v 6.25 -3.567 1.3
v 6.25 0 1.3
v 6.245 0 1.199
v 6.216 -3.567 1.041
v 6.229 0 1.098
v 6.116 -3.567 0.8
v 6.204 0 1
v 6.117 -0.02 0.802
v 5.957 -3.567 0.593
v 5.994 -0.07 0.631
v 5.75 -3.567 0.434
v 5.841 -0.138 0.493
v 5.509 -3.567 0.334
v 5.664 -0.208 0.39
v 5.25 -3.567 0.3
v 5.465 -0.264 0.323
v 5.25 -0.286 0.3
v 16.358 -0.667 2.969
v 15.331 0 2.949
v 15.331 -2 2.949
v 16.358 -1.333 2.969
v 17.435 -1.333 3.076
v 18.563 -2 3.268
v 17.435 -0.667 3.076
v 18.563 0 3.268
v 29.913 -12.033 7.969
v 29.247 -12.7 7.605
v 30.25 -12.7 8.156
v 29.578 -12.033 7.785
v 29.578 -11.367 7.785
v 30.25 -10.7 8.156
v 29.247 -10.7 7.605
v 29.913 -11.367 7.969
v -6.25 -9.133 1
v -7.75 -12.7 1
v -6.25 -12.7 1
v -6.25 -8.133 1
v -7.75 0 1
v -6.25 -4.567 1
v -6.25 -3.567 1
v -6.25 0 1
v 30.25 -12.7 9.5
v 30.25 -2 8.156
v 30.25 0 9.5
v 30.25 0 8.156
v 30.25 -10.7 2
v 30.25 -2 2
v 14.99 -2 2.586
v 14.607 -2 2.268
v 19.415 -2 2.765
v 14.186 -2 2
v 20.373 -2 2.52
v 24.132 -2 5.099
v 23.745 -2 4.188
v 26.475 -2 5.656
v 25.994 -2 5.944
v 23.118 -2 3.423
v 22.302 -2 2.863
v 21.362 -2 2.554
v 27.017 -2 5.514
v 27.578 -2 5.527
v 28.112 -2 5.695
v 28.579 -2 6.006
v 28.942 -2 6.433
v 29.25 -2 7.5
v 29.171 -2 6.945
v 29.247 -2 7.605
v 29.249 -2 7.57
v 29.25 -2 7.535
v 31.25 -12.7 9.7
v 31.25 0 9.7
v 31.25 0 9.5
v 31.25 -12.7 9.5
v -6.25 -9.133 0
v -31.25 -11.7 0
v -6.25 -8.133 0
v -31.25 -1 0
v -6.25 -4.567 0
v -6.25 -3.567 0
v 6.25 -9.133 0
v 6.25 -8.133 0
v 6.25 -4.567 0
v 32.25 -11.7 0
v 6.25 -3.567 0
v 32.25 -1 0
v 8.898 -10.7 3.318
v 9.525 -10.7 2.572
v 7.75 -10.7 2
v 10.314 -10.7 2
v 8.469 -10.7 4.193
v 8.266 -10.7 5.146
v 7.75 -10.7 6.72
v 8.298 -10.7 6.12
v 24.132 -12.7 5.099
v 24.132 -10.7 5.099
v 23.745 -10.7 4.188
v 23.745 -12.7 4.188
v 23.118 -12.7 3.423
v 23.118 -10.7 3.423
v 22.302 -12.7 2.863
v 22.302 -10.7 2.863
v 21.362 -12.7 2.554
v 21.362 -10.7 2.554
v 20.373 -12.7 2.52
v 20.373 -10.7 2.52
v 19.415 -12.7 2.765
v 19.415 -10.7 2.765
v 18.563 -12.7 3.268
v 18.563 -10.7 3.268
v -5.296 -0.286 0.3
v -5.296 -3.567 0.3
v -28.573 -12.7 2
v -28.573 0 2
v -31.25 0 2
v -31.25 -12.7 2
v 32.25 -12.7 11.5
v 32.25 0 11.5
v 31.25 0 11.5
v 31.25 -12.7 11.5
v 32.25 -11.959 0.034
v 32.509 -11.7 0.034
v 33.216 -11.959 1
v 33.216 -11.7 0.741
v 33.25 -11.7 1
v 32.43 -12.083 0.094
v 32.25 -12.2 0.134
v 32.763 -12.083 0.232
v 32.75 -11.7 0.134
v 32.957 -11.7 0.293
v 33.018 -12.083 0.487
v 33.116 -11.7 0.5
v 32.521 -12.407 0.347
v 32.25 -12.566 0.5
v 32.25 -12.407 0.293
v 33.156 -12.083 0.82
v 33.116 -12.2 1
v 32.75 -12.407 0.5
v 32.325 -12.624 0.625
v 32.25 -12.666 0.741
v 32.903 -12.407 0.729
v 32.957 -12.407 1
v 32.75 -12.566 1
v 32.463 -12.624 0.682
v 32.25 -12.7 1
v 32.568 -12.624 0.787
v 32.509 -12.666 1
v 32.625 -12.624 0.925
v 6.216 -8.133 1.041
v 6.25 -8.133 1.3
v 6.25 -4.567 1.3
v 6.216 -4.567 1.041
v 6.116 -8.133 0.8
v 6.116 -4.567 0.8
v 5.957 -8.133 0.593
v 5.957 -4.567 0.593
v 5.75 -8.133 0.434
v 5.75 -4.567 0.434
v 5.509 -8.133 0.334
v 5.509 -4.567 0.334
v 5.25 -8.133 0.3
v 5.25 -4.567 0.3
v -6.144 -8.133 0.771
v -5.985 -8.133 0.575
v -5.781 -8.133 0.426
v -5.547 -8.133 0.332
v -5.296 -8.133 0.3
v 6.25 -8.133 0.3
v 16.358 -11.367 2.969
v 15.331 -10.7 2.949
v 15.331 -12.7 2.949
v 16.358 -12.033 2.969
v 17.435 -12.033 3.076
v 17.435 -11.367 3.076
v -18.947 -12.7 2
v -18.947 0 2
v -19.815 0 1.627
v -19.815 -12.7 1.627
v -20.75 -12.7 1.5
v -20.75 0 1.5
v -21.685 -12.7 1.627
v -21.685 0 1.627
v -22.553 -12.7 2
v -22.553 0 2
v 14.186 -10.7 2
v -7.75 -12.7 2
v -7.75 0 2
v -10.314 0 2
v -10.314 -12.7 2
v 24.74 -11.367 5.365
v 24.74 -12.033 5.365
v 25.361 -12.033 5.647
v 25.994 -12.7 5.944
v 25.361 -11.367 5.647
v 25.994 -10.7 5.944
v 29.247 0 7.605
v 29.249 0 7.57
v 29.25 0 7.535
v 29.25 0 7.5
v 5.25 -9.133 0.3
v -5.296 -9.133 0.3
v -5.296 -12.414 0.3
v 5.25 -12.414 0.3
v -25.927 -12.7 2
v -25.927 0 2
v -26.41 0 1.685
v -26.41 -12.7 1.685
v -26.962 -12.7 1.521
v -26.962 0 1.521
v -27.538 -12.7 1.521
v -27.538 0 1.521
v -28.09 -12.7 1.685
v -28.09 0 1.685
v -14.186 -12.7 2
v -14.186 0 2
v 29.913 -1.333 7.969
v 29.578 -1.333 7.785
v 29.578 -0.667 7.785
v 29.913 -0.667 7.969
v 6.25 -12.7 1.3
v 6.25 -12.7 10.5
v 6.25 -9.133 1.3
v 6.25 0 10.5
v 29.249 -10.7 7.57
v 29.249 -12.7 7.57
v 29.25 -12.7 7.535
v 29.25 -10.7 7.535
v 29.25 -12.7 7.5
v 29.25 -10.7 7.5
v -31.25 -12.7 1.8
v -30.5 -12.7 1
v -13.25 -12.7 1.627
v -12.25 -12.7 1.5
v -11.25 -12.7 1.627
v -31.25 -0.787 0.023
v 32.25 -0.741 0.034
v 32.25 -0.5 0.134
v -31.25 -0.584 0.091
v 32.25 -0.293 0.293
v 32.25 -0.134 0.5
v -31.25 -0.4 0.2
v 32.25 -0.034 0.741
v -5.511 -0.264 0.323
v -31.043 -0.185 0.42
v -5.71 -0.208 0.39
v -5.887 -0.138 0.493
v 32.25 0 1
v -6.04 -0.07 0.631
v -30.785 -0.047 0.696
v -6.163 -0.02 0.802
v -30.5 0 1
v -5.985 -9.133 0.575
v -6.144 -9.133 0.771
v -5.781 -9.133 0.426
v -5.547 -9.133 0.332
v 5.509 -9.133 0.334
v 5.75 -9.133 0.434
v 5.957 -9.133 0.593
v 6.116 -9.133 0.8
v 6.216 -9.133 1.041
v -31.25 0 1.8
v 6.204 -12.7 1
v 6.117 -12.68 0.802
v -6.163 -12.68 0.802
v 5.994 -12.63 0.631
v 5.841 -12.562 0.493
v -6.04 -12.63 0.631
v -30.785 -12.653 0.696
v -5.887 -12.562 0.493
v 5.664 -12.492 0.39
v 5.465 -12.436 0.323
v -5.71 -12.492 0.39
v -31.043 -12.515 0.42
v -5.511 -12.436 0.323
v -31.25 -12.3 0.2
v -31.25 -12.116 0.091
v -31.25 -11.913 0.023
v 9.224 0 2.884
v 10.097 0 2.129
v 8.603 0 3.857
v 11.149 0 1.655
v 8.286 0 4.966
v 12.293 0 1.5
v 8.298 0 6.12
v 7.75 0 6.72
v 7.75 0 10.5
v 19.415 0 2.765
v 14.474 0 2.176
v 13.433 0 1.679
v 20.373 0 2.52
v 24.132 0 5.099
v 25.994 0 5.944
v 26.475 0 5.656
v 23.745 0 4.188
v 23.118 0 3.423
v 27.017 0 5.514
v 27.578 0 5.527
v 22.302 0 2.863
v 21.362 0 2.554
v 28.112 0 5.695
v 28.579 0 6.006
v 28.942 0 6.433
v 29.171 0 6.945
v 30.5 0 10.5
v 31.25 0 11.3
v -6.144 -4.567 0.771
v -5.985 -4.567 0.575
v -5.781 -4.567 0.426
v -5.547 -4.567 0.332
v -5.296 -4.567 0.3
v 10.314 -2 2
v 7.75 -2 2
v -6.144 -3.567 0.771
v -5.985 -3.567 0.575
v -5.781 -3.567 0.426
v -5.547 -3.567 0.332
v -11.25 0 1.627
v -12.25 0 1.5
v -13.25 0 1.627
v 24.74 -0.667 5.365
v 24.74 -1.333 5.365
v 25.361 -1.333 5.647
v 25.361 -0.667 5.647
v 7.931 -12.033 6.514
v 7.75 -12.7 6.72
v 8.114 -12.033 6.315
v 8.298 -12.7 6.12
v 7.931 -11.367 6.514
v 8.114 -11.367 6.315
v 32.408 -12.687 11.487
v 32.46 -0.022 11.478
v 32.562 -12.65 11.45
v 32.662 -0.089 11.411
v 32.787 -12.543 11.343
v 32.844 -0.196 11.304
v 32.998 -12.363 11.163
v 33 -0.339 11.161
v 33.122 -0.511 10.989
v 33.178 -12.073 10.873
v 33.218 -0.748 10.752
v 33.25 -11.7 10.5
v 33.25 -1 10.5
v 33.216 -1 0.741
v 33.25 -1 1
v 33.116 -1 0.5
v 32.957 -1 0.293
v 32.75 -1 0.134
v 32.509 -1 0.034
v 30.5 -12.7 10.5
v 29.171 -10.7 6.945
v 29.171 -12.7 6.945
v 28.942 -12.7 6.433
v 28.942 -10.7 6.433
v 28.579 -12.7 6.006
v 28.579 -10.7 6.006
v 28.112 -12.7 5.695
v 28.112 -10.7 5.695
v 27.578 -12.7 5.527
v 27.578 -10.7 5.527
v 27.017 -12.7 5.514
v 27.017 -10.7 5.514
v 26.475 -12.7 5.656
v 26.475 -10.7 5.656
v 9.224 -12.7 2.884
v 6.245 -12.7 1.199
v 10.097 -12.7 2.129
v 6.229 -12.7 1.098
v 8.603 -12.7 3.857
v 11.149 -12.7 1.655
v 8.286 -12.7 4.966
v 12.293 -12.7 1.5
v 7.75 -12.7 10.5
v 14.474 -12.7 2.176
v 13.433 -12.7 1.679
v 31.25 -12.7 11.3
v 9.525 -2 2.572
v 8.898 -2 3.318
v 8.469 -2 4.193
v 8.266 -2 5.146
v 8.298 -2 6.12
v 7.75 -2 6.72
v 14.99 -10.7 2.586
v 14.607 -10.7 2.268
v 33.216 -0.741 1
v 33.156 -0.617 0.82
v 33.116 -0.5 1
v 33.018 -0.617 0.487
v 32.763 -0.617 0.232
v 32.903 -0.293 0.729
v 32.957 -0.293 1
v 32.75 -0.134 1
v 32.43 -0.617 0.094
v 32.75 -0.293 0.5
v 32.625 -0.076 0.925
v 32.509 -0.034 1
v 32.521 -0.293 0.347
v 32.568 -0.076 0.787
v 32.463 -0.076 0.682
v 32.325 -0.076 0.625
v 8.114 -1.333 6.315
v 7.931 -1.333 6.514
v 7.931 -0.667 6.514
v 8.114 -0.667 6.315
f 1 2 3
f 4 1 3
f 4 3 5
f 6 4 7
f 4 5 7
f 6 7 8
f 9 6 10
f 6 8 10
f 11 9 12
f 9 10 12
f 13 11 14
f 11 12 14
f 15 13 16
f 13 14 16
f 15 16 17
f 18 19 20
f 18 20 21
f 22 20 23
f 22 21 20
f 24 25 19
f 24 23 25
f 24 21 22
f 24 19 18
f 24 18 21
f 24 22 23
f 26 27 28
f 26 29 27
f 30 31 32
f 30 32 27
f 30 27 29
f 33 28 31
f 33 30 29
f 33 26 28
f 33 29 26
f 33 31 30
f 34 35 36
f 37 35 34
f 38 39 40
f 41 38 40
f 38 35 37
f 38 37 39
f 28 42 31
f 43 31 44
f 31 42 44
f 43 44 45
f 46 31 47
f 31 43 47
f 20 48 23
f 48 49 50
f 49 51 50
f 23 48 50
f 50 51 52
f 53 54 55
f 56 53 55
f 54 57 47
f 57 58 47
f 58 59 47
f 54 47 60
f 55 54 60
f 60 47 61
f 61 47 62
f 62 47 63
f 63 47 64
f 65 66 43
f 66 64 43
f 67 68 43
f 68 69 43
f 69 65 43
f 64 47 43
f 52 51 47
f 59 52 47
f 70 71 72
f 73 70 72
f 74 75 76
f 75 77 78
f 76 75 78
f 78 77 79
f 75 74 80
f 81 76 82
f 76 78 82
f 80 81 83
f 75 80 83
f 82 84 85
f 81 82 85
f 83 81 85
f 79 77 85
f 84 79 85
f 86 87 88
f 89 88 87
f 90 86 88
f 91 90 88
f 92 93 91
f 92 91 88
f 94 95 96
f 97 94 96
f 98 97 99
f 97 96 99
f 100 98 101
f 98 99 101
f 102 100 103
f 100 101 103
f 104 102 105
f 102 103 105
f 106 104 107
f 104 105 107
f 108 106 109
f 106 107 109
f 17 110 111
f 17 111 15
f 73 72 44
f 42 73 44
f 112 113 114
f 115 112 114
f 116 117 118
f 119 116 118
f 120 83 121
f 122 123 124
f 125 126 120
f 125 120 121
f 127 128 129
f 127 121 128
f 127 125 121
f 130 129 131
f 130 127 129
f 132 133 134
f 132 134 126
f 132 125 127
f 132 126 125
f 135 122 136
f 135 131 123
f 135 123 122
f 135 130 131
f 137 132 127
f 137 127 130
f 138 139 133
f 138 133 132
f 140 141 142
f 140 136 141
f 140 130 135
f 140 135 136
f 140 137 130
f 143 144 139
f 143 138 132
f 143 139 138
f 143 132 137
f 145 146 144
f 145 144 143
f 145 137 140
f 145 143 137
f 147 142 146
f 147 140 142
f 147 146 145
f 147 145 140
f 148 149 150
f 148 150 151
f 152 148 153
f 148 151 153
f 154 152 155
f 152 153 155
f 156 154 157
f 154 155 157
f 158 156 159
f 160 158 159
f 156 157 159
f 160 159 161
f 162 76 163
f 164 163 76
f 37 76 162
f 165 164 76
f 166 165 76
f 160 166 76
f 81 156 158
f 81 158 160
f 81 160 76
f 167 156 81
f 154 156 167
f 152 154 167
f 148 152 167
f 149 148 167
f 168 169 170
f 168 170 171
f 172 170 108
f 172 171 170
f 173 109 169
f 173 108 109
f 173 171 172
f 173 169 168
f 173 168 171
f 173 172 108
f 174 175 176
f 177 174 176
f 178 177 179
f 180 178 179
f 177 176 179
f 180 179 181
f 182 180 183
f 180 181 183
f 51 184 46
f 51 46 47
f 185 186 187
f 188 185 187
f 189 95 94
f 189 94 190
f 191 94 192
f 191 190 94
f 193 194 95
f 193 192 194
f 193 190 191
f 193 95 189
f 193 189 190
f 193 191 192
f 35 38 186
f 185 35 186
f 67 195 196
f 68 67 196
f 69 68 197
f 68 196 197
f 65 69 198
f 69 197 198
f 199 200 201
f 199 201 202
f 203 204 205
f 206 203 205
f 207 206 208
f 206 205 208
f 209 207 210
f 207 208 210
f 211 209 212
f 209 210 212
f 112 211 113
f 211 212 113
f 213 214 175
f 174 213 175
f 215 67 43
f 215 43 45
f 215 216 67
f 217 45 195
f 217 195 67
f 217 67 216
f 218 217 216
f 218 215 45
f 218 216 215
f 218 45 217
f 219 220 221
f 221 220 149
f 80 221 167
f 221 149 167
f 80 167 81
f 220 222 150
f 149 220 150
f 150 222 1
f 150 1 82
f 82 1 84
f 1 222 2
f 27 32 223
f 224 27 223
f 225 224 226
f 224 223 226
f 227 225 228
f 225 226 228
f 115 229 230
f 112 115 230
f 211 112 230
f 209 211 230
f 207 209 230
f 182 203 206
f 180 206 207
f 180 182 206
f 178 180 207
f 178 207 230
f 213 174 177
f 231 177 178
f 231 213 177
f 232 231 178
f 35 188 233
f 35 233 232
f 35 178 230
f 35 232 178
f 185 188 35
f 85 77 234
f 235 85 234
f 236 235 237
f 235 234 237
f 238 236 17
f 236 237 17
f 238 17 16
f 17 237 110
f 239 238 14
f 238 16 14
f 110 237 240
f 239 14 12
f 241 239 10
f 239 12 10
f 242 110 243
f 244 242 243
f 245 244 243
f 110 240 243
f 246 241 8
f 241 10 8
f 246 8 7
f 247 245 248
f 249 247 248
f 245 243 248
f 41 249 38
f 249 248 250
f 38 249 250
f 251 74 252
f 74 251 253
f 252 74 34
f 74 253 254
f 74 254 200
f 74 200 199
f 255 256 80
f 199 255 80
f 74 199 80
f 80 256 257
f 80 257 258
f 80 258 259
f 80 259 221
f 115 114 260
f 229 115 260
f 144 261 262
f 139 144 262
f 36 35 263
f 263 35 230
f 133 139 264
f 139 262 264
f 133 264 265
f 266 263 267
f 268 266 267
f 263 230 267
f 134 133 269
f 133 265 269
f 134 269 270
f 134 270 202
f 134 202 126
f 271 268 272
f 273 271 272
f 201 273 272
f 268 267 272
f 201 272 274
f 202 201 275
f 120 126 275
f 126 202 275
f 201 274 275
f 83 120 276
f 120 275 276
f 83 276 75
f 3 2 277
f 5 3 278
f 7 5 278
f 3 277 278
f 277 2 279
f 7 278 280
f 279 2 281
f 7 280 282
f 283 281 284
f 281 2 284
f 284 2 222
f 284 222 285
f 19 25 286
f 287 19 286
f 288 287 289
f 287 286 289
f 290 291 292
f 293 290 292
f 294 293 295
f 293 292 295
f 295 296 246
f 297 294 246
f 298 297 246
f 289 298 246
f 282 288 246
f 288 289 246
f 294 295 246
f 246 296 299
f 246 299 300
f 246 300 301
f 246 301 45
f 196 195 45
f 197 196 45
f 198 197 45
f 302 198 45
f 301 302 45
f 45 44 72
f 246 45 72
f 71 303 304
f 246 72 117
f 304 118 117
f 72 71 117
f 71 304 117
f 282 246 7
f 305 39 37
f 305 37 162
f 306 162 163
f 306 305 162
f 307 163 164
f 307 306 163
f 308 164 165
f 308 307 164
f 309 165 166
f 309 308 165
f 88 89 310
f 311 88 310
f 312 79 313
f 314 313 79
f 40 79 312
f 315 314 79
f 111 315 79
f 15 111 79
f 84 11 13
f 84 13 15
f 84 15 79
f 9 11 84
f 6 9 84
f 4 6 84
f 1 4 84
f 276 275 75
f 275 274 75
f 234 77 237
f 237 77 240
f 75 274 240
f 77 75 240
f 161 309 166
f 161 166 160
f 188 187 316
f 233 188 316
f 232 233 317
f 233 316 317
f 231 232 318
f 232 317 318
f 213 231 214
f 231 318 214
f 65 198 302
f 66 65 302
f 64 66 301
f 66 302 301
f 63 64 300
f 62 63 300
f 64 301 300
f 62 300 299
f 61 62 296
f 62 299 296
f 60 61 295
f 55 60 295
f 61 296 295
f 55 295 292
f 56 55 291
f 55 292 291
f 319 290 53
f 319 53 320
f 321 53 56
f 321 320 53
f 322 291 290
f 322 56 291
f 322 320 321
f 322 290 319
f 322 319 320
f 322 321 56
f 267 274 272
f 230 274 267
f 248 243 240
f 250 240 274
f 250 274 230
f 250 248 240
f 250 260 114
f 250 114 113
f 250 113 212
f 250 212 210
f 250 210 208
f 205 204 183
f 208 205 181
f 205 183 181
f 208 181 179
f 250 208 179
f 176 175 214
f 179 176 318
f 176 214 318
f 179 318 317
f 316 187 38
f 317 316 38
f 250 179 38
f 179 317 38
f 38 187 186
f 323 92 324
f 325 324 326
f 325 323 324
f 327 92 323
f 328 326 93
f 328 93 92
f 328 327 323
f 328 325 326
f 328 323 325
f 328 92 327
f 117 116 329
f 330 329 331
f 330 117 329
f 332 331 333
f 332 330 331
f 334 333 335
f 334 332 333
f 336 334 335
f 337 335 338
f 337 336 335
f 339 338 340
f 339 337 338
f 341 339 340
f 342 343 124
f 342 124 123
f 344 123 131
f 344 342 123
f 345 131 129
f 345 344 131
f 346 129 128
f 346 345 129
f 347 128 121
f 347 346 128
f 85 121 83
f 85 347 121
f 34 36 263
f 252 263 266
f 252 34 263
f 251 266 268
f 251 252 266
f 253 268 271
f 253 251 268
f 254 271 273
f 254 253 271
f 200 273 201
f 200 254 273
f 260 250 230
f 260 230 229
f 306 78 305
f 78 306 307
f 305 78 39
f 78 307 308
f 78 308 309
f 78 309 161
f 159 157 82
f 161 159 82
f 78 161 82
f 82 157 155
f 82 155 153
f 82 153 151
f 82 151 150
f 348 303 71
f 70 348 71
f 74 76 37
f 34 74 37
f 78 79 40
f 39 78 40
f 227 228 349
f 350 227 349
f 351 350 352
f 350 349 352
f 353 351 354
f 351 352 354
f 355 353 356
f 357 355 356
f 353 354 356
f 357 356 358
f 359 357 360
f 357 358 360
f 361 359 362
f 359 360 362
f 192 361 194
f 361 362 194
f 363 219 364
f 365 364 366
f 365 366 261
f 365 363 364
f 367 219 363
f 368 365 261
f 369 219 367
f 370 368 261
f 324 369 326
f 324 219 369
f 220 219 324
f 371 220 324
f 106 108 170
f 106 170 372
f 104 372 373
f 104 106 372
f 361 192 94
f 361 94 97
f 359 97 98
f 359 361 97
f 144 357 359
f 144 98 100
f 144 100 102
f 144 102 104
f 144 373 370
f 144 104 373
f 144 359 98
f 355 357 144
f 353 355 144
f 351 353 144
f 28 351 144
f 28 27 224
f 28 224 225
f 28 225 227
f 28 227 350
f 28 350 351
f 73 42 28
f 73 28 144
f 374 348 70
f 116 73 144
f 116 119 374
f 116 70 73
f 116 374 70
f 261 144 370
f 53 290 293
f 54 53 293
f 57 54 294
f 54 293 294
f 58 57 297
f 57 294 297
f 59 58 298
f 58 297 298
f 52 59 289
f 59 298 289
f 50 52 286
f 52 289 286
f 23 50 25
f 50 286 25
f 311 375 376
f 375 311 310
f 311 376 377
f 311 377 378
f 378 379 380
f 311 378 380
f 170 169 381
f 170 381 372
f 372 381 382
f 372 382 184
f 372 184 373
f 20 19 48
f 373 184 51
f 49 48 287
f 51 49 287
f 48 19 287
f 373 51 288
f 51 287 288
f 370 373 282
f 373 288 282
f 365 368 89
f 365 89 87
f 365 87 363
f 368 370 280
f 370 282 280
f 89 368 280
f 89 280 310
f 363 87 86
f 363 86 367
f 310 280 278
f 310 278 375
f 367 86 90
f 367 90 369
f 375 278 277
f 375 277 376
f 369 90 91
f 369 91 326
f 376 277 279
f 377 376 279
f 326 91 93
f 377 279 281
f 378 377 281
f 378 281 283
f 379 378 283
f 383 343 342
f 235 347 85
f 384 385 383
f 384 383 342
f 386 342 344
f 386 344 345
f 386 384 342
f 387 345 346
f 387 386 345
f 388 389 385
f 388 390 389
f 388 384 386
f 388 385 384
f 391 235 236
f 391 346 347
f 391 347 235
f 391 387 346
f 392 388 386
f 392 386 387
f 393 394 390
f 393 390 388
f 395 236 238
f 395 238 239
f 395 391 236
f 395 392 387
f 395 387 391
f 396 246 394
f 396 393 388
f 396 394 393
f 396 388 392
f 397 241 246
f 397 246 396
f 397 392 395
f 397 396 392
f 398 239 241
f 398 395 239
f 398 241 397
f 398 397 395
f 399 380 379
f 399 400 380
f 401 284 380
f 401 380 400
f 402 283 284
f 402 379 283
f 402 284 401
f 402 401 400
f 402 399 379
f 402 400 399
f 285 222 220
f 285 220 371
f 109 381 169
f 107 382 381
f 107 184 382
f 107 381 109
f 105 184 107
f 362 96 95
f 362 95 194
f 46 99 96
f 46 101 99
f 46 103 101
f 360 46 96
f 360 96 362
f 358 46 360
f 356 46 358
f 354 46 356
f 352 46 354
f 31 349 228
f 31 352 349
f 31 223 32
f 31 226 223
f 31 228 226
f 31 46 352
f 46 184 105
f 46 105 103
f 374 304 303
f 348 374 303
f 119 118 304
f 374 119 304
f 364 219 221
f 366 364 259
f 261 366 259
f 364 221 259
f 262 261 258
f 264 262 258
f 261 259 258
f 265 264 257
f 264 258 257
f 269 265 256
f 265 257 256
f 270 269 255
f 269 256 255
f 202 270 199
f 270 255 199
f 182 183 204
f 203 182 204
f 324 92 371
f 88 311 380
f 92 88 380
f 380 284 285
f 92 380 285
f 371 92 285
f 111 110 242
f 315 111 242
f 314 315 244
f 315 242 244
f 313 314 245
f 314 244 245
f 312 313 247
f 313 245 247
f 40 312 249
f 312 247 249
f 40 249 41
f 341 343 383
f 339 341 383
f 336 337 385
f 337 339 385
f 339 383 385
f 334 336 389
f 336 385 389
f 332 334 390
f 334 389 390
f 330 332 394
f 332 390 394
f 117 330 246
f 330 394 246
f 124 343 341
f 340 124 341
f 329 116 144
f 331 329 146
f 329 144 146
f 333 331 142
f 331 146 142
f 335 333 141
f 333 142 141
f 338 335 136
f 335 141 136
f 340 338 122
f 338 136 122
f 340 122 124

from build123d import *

# Parameters (mm, degrees)
F1_W          = 12.5
F1_H          = 0.3
F2_DEPTH      = 12.7
F5_START      = -1
F3_W          = 8.7
F3_H          = 6.7194561801
F5_DEPTH      = 22.5
F4_W          = 1.5
F4_H          = 1
F6_DEPTH      = 12.7
F4_H_2        = 10.5
F7_DEPTH      = 12.7
F8_W          = 12.5
F8_H          = 1
F9_DEPTH      = 0.3
F10_T1_DEPTH  = 3.5666666667
F10_T3_DEPTH  = 3.5666666667
F10_T5_DEPTH  = 3.5666666667
F10_T10_DEPTH = 8.5666666667
F10_T15_DEPTH = 8.5666666667
F10_T20_DEPTH = 8.5666666667
F10_T25_DEPTH = 8.5666666667
F10_T30_DEPTH = 8.3363626738
F10_T35_DEPTH = 8.3363626738
F10_T40_DEPTH = 8.3363626738
F10_T45_DEPTH = 8.3363626738
F11_T1_DEPTH  = 66
F11_T3_DEPTH  = 10.7
F11_T5_DEPTH  = 13
F11_T7_DEPTH  = 17.7
F11_S11_W     = 1
F11_S11_H     = 1
F11_T12_DEPTH = 1
F11_S17_W     = 1
F11_S17_H     = 1
F11_T18_DEPTH = 1


# Not quite as in the source:
# - a fillet or chamfer that OpenCascade refuses, or shapes differently, is made with other operations: its cross-section is extruded or revolved along the edge and cut away or added
# - a feature names something its author has since deleted; it is built from what else it names


with BuildPart() as f2:
    # F1 (on Front) → F2 (new body)
    with BuildSketch(Plane.XZ):
        with BuildLine():
            ThreePointArc((-25.9271243445, 2), (-27.25, 1.5), (-28.5728756555, 2))
            Line((-28.5728756555, 2), (-31.25, 2))
            Line((-31.25, 2), (-31.25, 0))
            Line((-31.25, 0), (-6.25, 0))
            Line((-6.25, 0), (-6.25, 0.3))
            Line((-6.25, 0.3), (-6.25, 2))
            Line((-6.25, 2), (-10.3135083269, 2))
            ThreePointArc((-10.3135083269, 2), (-12.25, 1.5), (-14.1864916731, 2))
            Line((-14.1864916731, 2), (-18.9472243623, 2))
            ThreePointArc((-18.9472243623, 2), (-20.75, 1.5), (-22.5527756377, 2))
            Line((-22.5527756377, 2), (-25.9271243445, 2))
        make_face()
        with Locations((0, 0.15)):
            Rectangle(F1_W, F1_H)
        with BuildLine():
            Line((6.25, 0.3), (6.25, 0))
            Line((6.25, 0), (31.25, 0))
            Line((31.25, 0), (31.25, 8.7194561801))
            add(Edge.make_bspline(
                [(29.2472199547, 7.6054156174), (29.8970928976, 7.9568787945), (30.5644371549, 8.3282256487), (31.25, 8.7194561801)],
                knots=[23.7294142738, 23.7294142738, 23.7294142738, 23.7294142738, 25, 25, 25, 25], degree=3))
            ThreePointArc((29.2472199547, 7.6054156174), (29.2493048679, 7.5527261345), (29.25, 7.5))
            ThreePointArc((29.25, 7.5), (28.112399222, 5.6954868851), (25.993732418, 5.9437892937))
            add(Edge.make_bspline(
                [(24.1320332758, 5.0989722973), (24.7343267633, 5.3573256266), (25.3545781422, 5.638931292), (25.993732418, 5.9437892937)],
                knots=[20.1331955968, 20.1331955968, 20.1331955968, 20.1331955968, 21.5072025076, 21.5072025076, 21.5072025076, 21.5072025076], degree=3))
            ThreePointArc((24.1320332758, 5.0989722973), (21.8431992343, 2.6751067033), (18.5625536561, 3.2677704173))
            add(Edge.make_bspline(
                [(15.3309754243, 2.9490020708), (16.3348264574, 2.926604162), (17.4079195378, 3.0328602775), (18.5625536561, 3.2677704173)],
                knots=[12.2186665261, 12.2186665261, 12.2186665261, 12.2186665261, 15.4506364332, 15.4506364332, 15.4506364332, 15.4506364332], degree=3))
            ThreePointArc((15.3309754243, 2.9490020708), (10.6056653115, 1.8536095338), (8.2983946259, 6.1203345608))
            add(Edge.make_bspline(
                [(6.25, 8.7194561801), (6.9059645215, 7.7244768722), (7.5846653889, 6.8581029991), (8.2983946259, 6.1203345608)],
                knots=[0, 0, 0, 0, 3.2313595313, 3.2313595313, 3.2313595313, 3.2313595313], degree=3))
            Line((6.25, 8.7194561801), (6.25, 0.3))
        make_face()
    extrude(amount=F2_DEPTH)

    # F3 (on face) → F5 (cut)
    with BuildSketch(Plane.YZ.offset(31.25).offset(F5_START)):
        with Locations((-6.35, 5.35972809)):
            Rectangle(F3_W, F3_H)
    extrude(amount=-F5_DEPTH, mode=Mode.SUBTRACT)

    # F4 (on Front) → F6 (cut, through all)
    with BuildSketch(Plane.XZ):
        with Locations((-7, 1.5)):
            Rectangle(F4_W, F4_H)
        Polygon((-30.5, 1), (-31.25, 1.8), (-31.25, 1), align=None)
        Polygon((-30.5, 1), (-31.25, 1), (-31.25, 0.2), align=None)
    extrude(amount=F6_DEPTH, mode=Mode.SUBTRACT)

    # F4 (on Front) → F7 (join, through all)
    with BuildSketch(Plane.XZ):
        Polygon((30.25, 0), (31.25, 0), (33.25, 0), (33.25, 11.5), (31.25, 11.5), (31.25, 11.3), (31.25, 10.5), (31.25, 9.7), (31.25, 9.5), (30.25, 9.5), align=None)
        with Locations((7, 5.25)):
            Rectangle(F4_W, F4_H_2)
        Polygon((30.5, 10.5), (31.25, 9.7), (31.25, 10.5), align=None)
        Polygon((31.25, 10.5), (31.25, 11.3), (30.5, 10.5), align=None)
    extrude(amount=F7_DEPTH)

    # F8 (on face) → F9 (cut, through all)
    with BuildSketch(Plane.XY.offset(0.3)):
        with Locations((0, -8.6333333333)):
            Rectangle(F8_W, F8_H)
        with Locations((0, -4.0666666667)):
            Rectangle(F8_W, F8_H)
    extrude(amount=-F9_DEPTH, mode=Mode.SUBTRACT)

    # F10: fillet of radius 1 on 6 edges, made by hand

    # F10_s2 → F10_t1 (join)
    with BuildSketch(Plane.XZ.offset(9.1333333333)):
        with BuildLine():
            ThreePointArc((6.25, 1.3), (5.9571067812, 0.5928932188), (5.25, 0.3))
            Line((5.25, 0.3), (6.25, 0.3))
            Line((6.25, 0.3), (6.25, 1.3))
        make_face()
        with BuildLine():
            ThreePointArc((-6.25, 1), (-5.8876687769, 0.4937742252), (-5.2960607986, 0.3))
            Line((-5.2960607986, 0.3), (-6.25, 0.3))
            Line((-6.25, 0.3), (-6.25, 1))
        make_face()
    extrude(amount=F10_T1_DEPTH)

    # F10_s4 → F10_t3 (join)
    with BuildSketch(Plane.XZ.offset(4.5666666667)):
        with BuildLine():
            ThreePointArc((6.25, 1.3), (5.9571067812, 0.5928932188), (5.25, 0.3))
            Line((5.25, 0.3), (6.25, 0.3))
            Line((6.25, 0.3), (6.25, 1.3))
        make_face()
        with BuildLine():
            ThreePointArc((-6.25, 1), (-5.8876687769, 0.4937742252), (-5.2960607986, 0.3))
            Line((-5.2960607986, 0.3), (-6.25, 0.3))
            Line((-6.25, 0.3), (-6.25, 1))
        make_face()
    extrude(amount=F10_T3_DEPTH)

    # F10_s6 → F10_t5 (join)
    with BuildSketch(Plane.XZ):
        with BuildLine():
            ThreePointArc((6.25, 1.3), (5.9571067812, 0.5928932188), (5.25, 0.3))
            Line((5.25, 0.3), (6.25, 0.3))
            Line((6.25, 0.3), (6.25, 1.3))
        make_face()
        with BuildLine():
            ThreePointArc((-5.2960607986, 0.3), (-5.8876687769, 0.4937742252), (-6.25, 1))
            Line((-6.25, 1), (-6.25, 0.3))
            Line((-6.25, 0.3), (-5.2960607986, 0.3))
        make_face()
    extrude(amount=F10_T5_DEPTH)


with BuildPart() as f10_tool8:
    # F10_s9 → F10_t10 (new body)
    with BuildSketch(Plane.XZ.offset(6.6333333333)):
        with BuildLine():
            ThreePointArc((6.25, 1.3), (5.9571067812, 0.5928932188), (5.25, 0.3))
            Line((5.25, 0.3), (6.25, 0.3))
            Line((6.25, 0.3), (6.25, 1.3))
        make_face()
    extrude(amount=F10_T10_DEPTH)

    split(bisect_by=Plane.XZ.offset(8.1333333333), keep=Keep.BOTTOM)


with BuildPart() as f2_1:
    add(f2.part)

    # F10_t7: union F10_tool8
    add(f10_tool8.part)


with BuildPart() as f10_tool13:
    # F10_s14 → F10_t15 (new body)
    with BuildSketch(Plane.XZ.offset(2.0666666667)):
        with BuildLine():
            ThreePointArc((6.25, 1.3), (5.9571067812, 0.5928932188), (5.25, 0.3))
            Line((5.25, 0.3), (6.25, 0.3))
            Line((6.25, 0.3), (6.25, 1.3))
        make_face()
    extrude(amount=F10_T15_DEPTH)

    split(bisect_by=Plane.XZ.offset(3.5666666667), keep=Keep.BOTTOM)


with BuildPart() as f2_2:
    add(f2_1.part)

    # F10_t12: union F10_tool13
    add(f10_tool13.part)


with BuildPart() as f10_tool18:
    # F10_s19 → F10_t20 (new body)
    with BuildSketch(Plane.XZ.offset(2.0666666667)):
        with BuildLine():
            ThreePointArc((6.25, 1.3), (5.9571067812, 0.5928932188), (5.25, 0.3))
            Line((5.25, 0.3), (6.25, 0.3))
            Line((6.25, 0.3), (6.25, 1.3))
        make_face()
    extrude(amount=F10_T20_DEPTH)

    split(bisect_by=Plane.XZ.offset(9.1333333333), keep=Keep.TOP)


with BuildPart() as f2_3:
    add(f2_2.part)

    # F10_t17: union F10_tool18
    add(f10_tool18.part)


with BuildPart() as f10_tool23:
    # F10_s24 → F10_t25 (new body)
    with BuildSketch(Plane.XZ.offset(-2.5)):
        with BuildLine():
            ThreePointArc((6.25, 1.3), (5.9571067812, 0.5928932188), (5.25, 0.3))
            Line((5.25, 0.3), (6.25, 0.3))
            Line((6.25, 0.3), (6.25, 1.3))
        make_face()
    extrude(amount=F10_T25_DEPTH)

    split(bisect_by=Plane.XZ.offset(4.5666666667), keep=Keep.TOP)


with BuildPart() as f2_4:
    add(f2_3.part)

    # F10_t22: union F10_tool23
    add(f10_tool23.part)


with BuildPart() as f10_tool28:
    # F10_s29 → F10_t30 (new body)
    with BuildSketch(Plane.XZ.offset(-2.3848480035)):
        with BuildLine():
            ThreePointArc((-5.2960607986, 0.3), (-5.8876687769, 0.4937742252), (-6.25, 1))
            Line((-6.25, 1), (-6.25, 0.3))
            Line((-6.25, 0.3), (-5.2960607986, 0.3))
        make_face()
    extrude(amount=F10_T30_DEPTH)

    split(bisect_by=Plane.XZ.offset(4.5666666667), keep=Keep.TOP)


with BuildPart() as f2_5:
    add(f2_4.part)

    # F10_t27: union F10_tool28
    add(f10_tool28.part)


with BuildPart() as f10_tool33:
    # F10_s34 → F10_t35 (new body)
    with BuildSketch(Plane.XZ.offset(2.1818186631)):
        with BuildLine():
            ThreePointArc((-6.25, 1), (-5.8876687769, 0.4937742252), (-5.2960607986, 0.3))
            Line((-5.2960607986, 0.3), (-6.25, 0.3))
            Line((-6.25, 0.3), (-6.25, 1))
        make_face()
    extrude(amount=F10_T35_DEPTH)

    split(bisect_by=Plane.XZ.offset(3.5666666667), keep=Keep.BOTTOM)


with BuildPart() as f2_6:
    add(f2_5.part)

    # F10_t32: union F10_tool33
    add(f10_tool33.part)


with BuildPart() as f10_tool38:
    # F10_s39 → F10_t40 (new body)
    with BuildSketch(Plane.XZ.offset(2.1818186631)):
        with BuildLine():
            ThreePointArc((-6.25, 1), (-5.8876687769, 0.4937742252), (-5.2960607986, 0.3))
            Line((-5.2960607986, 0.3), (-6.25, 0.3))
            Line((-6.25, 0.3), (-6.25, 1))
        make_face()
    extrude(amount=F10_T40_DEPTH)

    split(bisect_by=Plane.XZ.offset(9.1333333333), keep=Keep.TOP)


with BuildPart() as f2_7:
    add(f2_6.part)

    # F10_t37: union F10_tool38
    add(f10_tool38.part)


with BuildPart() as f10_tool43:
    # F10_s44 → F10_t45 (new body)
    with BuildSketch(Plane.XZ.offset(6.7484853298)):
        with BuildLine():
            ThreePointArc((-6.25, 1), (-5.8876687769, 0.4937742252), (-5.2960607986, 0.3))
            Line((-5.2960607986, 0.3), (-6.25, 0.3))
            Line((-6.25, 0.3), (-6.25, 1))
        make_face()
    extrude(amount=F10_T45_DEPTH)

    split(bisect_by=Plane.XZ.offset(8.1333333333), keep=Keep.BOTTOM)


with BuildPart() as f2_8:
    add(f2_7.part)

    # F10_t42: union F10_tool43
    add(f10_tool43.part)

    # F11: fillet of radius 1 on 6 edges, made by hand

    # F11_s2 → F11_t1 (cut)
    with BuildSketch(Plane.YZ.offset(-33.75)):
        with BuildLine():
            ThreePointArc((-1, 0), (-0.2928932188, 0.2928932188), (0, 1))
            Line((0, 1), (0, 0))
            Line((0, 0), (-1, 0))
        make_face()
        with BuildLine():
            ThreePointArc((-12.7, 1), (-12.4071067812, 0.2928932188), (-11.7, 0))
            Line((-11.7, 0), (-12.7, 0))
            Line((-12.7, 0), (-12.7, 1))
        make_face()
    extrude(amount=F11_T1_DEPTH, mode=Mode.SUBTRACT)

    # F11_s4 → F11_t3 (cut)
    with BuildSketch(Plane.XZ.offset(1)):
        with BuildLine():
            ThreePointArc((33.25, 1), (32.9571067812, 0.2928932188), (32.25, 0))
            Line((32.25, 0), (33.25, 0))
            Line((33.25, 0), (33.25, 1))
        make_face()
    extrude(amount=F11_T3_DEPTH, mode=Mode.SUBTRACT)

    # F11_s6 → F11_t5 (cut)
    with BuildSketch(Plane.XY.offset(1)):
        with BuildLine():
            ThreePointArc((32.25, -12.7), (32.9571067812, -12.4071067812), (33.25, -11.7))
            Line((33.25, -11.7), (33.25, -12.7))
            Line((33.25, -12.7), (32.25, -12.7))
        make_face()
        with BuildLine():
            ThreePointArc((33.25, -1), (32.9571067812, -0.2928932188), (32.25, 0))
            Line((32.25, 0), (33.25, 0))
            Line((33.25, 0), (33.25, -1))
        make_face()
    extrude(amount=F11_T5_DEPTH, mode=Mode.SUBTRACT)

    # F11_s8 → F11_t7 (cut)
    with BuildSketch(Plane.XZ.offset(-2.5)):
        with BuildLine():
            ThreePointArc((32.25, 11.5), (32.9571067812, 11.2071067812), (33.25, 10.5))
            Line((33.25, 10.5), (33.25, 11.5))
            Line((33.25, 11.5), (32.25, 11.5))
        make_face()
    extrude(amount=F11_T7_DEPTH, mode=Mode.SUBTRACT)


with BuildPart() as f11_tool10:
    # F11_s11 → F11_t12 (new body)
    with BuildSketch(Plane.XZ.offset(1)):
        with Locations((32.75, 0.5)):
            Rectangle(F11_S11_W, F11_S11_H)
    extrude(amount=-F11_T12_DEPTH)

    # F11_s13 → F11_t14 (revolve, cut)
    with BuildSketch(Plane(origin=(32.25, -1, 1), x_dir=(-0.7071067812, 0, 0.7071067812), z_dir=(-0.7071067812, 0, -0.7071067812))):
        with BuildLine():
            ThreePointArc((0, -1), (1, 0), (0, 1))
            Line((0, 1), (0, -1))
        make_face()
    revolve(axis=Axis((32.25, -1, 1), (0, 1, 0)), mode=Mode.SUBTRACT)


with BuildPart() as f2_9:
    add(f2_8.part)

    # F11_t9: cut F11_tool10
    add(f11_tool10.part, mode=Mode.SUBTRACT)


with BuildPart() as f11_tool16:
    # F11_s17 → F11_t18 (new body)
    with BuildSketch(Plane.XZ.offset(11.7)):
        with Locations((32.75, 0.5)):
            Rectangle(F11_S17_W, F11_S17_H)
    extrude(amount=F11_T18_DEPTH)

    # F11_s19 → F11_t20 (revolve, cut)
    with BuildSketch(Plane(origin=(32.25, -11.7, 1), x_dir=(-0.7071067812, 0, 0.7071067812), z_dir=(0.7071067812, 0, 0.7071067812))):
        with BuildLine():
            ThreePointArc((0, -1), (1, 0), (0, 1))
            Line((0, 1), (0, -1))
        make_face()
    revolve(axis=Axis((32.25, -11.7, 1), (0, -1, 0)), mode=Mode.SUBTRACT)


with BuildPart() as f2_10:
    add(f2_9.part)

    # F11_t15: cut F11_tool16
    add(f11_tool16.part, mode=Mode.SUBTRACT)


solid = f2_10.part
